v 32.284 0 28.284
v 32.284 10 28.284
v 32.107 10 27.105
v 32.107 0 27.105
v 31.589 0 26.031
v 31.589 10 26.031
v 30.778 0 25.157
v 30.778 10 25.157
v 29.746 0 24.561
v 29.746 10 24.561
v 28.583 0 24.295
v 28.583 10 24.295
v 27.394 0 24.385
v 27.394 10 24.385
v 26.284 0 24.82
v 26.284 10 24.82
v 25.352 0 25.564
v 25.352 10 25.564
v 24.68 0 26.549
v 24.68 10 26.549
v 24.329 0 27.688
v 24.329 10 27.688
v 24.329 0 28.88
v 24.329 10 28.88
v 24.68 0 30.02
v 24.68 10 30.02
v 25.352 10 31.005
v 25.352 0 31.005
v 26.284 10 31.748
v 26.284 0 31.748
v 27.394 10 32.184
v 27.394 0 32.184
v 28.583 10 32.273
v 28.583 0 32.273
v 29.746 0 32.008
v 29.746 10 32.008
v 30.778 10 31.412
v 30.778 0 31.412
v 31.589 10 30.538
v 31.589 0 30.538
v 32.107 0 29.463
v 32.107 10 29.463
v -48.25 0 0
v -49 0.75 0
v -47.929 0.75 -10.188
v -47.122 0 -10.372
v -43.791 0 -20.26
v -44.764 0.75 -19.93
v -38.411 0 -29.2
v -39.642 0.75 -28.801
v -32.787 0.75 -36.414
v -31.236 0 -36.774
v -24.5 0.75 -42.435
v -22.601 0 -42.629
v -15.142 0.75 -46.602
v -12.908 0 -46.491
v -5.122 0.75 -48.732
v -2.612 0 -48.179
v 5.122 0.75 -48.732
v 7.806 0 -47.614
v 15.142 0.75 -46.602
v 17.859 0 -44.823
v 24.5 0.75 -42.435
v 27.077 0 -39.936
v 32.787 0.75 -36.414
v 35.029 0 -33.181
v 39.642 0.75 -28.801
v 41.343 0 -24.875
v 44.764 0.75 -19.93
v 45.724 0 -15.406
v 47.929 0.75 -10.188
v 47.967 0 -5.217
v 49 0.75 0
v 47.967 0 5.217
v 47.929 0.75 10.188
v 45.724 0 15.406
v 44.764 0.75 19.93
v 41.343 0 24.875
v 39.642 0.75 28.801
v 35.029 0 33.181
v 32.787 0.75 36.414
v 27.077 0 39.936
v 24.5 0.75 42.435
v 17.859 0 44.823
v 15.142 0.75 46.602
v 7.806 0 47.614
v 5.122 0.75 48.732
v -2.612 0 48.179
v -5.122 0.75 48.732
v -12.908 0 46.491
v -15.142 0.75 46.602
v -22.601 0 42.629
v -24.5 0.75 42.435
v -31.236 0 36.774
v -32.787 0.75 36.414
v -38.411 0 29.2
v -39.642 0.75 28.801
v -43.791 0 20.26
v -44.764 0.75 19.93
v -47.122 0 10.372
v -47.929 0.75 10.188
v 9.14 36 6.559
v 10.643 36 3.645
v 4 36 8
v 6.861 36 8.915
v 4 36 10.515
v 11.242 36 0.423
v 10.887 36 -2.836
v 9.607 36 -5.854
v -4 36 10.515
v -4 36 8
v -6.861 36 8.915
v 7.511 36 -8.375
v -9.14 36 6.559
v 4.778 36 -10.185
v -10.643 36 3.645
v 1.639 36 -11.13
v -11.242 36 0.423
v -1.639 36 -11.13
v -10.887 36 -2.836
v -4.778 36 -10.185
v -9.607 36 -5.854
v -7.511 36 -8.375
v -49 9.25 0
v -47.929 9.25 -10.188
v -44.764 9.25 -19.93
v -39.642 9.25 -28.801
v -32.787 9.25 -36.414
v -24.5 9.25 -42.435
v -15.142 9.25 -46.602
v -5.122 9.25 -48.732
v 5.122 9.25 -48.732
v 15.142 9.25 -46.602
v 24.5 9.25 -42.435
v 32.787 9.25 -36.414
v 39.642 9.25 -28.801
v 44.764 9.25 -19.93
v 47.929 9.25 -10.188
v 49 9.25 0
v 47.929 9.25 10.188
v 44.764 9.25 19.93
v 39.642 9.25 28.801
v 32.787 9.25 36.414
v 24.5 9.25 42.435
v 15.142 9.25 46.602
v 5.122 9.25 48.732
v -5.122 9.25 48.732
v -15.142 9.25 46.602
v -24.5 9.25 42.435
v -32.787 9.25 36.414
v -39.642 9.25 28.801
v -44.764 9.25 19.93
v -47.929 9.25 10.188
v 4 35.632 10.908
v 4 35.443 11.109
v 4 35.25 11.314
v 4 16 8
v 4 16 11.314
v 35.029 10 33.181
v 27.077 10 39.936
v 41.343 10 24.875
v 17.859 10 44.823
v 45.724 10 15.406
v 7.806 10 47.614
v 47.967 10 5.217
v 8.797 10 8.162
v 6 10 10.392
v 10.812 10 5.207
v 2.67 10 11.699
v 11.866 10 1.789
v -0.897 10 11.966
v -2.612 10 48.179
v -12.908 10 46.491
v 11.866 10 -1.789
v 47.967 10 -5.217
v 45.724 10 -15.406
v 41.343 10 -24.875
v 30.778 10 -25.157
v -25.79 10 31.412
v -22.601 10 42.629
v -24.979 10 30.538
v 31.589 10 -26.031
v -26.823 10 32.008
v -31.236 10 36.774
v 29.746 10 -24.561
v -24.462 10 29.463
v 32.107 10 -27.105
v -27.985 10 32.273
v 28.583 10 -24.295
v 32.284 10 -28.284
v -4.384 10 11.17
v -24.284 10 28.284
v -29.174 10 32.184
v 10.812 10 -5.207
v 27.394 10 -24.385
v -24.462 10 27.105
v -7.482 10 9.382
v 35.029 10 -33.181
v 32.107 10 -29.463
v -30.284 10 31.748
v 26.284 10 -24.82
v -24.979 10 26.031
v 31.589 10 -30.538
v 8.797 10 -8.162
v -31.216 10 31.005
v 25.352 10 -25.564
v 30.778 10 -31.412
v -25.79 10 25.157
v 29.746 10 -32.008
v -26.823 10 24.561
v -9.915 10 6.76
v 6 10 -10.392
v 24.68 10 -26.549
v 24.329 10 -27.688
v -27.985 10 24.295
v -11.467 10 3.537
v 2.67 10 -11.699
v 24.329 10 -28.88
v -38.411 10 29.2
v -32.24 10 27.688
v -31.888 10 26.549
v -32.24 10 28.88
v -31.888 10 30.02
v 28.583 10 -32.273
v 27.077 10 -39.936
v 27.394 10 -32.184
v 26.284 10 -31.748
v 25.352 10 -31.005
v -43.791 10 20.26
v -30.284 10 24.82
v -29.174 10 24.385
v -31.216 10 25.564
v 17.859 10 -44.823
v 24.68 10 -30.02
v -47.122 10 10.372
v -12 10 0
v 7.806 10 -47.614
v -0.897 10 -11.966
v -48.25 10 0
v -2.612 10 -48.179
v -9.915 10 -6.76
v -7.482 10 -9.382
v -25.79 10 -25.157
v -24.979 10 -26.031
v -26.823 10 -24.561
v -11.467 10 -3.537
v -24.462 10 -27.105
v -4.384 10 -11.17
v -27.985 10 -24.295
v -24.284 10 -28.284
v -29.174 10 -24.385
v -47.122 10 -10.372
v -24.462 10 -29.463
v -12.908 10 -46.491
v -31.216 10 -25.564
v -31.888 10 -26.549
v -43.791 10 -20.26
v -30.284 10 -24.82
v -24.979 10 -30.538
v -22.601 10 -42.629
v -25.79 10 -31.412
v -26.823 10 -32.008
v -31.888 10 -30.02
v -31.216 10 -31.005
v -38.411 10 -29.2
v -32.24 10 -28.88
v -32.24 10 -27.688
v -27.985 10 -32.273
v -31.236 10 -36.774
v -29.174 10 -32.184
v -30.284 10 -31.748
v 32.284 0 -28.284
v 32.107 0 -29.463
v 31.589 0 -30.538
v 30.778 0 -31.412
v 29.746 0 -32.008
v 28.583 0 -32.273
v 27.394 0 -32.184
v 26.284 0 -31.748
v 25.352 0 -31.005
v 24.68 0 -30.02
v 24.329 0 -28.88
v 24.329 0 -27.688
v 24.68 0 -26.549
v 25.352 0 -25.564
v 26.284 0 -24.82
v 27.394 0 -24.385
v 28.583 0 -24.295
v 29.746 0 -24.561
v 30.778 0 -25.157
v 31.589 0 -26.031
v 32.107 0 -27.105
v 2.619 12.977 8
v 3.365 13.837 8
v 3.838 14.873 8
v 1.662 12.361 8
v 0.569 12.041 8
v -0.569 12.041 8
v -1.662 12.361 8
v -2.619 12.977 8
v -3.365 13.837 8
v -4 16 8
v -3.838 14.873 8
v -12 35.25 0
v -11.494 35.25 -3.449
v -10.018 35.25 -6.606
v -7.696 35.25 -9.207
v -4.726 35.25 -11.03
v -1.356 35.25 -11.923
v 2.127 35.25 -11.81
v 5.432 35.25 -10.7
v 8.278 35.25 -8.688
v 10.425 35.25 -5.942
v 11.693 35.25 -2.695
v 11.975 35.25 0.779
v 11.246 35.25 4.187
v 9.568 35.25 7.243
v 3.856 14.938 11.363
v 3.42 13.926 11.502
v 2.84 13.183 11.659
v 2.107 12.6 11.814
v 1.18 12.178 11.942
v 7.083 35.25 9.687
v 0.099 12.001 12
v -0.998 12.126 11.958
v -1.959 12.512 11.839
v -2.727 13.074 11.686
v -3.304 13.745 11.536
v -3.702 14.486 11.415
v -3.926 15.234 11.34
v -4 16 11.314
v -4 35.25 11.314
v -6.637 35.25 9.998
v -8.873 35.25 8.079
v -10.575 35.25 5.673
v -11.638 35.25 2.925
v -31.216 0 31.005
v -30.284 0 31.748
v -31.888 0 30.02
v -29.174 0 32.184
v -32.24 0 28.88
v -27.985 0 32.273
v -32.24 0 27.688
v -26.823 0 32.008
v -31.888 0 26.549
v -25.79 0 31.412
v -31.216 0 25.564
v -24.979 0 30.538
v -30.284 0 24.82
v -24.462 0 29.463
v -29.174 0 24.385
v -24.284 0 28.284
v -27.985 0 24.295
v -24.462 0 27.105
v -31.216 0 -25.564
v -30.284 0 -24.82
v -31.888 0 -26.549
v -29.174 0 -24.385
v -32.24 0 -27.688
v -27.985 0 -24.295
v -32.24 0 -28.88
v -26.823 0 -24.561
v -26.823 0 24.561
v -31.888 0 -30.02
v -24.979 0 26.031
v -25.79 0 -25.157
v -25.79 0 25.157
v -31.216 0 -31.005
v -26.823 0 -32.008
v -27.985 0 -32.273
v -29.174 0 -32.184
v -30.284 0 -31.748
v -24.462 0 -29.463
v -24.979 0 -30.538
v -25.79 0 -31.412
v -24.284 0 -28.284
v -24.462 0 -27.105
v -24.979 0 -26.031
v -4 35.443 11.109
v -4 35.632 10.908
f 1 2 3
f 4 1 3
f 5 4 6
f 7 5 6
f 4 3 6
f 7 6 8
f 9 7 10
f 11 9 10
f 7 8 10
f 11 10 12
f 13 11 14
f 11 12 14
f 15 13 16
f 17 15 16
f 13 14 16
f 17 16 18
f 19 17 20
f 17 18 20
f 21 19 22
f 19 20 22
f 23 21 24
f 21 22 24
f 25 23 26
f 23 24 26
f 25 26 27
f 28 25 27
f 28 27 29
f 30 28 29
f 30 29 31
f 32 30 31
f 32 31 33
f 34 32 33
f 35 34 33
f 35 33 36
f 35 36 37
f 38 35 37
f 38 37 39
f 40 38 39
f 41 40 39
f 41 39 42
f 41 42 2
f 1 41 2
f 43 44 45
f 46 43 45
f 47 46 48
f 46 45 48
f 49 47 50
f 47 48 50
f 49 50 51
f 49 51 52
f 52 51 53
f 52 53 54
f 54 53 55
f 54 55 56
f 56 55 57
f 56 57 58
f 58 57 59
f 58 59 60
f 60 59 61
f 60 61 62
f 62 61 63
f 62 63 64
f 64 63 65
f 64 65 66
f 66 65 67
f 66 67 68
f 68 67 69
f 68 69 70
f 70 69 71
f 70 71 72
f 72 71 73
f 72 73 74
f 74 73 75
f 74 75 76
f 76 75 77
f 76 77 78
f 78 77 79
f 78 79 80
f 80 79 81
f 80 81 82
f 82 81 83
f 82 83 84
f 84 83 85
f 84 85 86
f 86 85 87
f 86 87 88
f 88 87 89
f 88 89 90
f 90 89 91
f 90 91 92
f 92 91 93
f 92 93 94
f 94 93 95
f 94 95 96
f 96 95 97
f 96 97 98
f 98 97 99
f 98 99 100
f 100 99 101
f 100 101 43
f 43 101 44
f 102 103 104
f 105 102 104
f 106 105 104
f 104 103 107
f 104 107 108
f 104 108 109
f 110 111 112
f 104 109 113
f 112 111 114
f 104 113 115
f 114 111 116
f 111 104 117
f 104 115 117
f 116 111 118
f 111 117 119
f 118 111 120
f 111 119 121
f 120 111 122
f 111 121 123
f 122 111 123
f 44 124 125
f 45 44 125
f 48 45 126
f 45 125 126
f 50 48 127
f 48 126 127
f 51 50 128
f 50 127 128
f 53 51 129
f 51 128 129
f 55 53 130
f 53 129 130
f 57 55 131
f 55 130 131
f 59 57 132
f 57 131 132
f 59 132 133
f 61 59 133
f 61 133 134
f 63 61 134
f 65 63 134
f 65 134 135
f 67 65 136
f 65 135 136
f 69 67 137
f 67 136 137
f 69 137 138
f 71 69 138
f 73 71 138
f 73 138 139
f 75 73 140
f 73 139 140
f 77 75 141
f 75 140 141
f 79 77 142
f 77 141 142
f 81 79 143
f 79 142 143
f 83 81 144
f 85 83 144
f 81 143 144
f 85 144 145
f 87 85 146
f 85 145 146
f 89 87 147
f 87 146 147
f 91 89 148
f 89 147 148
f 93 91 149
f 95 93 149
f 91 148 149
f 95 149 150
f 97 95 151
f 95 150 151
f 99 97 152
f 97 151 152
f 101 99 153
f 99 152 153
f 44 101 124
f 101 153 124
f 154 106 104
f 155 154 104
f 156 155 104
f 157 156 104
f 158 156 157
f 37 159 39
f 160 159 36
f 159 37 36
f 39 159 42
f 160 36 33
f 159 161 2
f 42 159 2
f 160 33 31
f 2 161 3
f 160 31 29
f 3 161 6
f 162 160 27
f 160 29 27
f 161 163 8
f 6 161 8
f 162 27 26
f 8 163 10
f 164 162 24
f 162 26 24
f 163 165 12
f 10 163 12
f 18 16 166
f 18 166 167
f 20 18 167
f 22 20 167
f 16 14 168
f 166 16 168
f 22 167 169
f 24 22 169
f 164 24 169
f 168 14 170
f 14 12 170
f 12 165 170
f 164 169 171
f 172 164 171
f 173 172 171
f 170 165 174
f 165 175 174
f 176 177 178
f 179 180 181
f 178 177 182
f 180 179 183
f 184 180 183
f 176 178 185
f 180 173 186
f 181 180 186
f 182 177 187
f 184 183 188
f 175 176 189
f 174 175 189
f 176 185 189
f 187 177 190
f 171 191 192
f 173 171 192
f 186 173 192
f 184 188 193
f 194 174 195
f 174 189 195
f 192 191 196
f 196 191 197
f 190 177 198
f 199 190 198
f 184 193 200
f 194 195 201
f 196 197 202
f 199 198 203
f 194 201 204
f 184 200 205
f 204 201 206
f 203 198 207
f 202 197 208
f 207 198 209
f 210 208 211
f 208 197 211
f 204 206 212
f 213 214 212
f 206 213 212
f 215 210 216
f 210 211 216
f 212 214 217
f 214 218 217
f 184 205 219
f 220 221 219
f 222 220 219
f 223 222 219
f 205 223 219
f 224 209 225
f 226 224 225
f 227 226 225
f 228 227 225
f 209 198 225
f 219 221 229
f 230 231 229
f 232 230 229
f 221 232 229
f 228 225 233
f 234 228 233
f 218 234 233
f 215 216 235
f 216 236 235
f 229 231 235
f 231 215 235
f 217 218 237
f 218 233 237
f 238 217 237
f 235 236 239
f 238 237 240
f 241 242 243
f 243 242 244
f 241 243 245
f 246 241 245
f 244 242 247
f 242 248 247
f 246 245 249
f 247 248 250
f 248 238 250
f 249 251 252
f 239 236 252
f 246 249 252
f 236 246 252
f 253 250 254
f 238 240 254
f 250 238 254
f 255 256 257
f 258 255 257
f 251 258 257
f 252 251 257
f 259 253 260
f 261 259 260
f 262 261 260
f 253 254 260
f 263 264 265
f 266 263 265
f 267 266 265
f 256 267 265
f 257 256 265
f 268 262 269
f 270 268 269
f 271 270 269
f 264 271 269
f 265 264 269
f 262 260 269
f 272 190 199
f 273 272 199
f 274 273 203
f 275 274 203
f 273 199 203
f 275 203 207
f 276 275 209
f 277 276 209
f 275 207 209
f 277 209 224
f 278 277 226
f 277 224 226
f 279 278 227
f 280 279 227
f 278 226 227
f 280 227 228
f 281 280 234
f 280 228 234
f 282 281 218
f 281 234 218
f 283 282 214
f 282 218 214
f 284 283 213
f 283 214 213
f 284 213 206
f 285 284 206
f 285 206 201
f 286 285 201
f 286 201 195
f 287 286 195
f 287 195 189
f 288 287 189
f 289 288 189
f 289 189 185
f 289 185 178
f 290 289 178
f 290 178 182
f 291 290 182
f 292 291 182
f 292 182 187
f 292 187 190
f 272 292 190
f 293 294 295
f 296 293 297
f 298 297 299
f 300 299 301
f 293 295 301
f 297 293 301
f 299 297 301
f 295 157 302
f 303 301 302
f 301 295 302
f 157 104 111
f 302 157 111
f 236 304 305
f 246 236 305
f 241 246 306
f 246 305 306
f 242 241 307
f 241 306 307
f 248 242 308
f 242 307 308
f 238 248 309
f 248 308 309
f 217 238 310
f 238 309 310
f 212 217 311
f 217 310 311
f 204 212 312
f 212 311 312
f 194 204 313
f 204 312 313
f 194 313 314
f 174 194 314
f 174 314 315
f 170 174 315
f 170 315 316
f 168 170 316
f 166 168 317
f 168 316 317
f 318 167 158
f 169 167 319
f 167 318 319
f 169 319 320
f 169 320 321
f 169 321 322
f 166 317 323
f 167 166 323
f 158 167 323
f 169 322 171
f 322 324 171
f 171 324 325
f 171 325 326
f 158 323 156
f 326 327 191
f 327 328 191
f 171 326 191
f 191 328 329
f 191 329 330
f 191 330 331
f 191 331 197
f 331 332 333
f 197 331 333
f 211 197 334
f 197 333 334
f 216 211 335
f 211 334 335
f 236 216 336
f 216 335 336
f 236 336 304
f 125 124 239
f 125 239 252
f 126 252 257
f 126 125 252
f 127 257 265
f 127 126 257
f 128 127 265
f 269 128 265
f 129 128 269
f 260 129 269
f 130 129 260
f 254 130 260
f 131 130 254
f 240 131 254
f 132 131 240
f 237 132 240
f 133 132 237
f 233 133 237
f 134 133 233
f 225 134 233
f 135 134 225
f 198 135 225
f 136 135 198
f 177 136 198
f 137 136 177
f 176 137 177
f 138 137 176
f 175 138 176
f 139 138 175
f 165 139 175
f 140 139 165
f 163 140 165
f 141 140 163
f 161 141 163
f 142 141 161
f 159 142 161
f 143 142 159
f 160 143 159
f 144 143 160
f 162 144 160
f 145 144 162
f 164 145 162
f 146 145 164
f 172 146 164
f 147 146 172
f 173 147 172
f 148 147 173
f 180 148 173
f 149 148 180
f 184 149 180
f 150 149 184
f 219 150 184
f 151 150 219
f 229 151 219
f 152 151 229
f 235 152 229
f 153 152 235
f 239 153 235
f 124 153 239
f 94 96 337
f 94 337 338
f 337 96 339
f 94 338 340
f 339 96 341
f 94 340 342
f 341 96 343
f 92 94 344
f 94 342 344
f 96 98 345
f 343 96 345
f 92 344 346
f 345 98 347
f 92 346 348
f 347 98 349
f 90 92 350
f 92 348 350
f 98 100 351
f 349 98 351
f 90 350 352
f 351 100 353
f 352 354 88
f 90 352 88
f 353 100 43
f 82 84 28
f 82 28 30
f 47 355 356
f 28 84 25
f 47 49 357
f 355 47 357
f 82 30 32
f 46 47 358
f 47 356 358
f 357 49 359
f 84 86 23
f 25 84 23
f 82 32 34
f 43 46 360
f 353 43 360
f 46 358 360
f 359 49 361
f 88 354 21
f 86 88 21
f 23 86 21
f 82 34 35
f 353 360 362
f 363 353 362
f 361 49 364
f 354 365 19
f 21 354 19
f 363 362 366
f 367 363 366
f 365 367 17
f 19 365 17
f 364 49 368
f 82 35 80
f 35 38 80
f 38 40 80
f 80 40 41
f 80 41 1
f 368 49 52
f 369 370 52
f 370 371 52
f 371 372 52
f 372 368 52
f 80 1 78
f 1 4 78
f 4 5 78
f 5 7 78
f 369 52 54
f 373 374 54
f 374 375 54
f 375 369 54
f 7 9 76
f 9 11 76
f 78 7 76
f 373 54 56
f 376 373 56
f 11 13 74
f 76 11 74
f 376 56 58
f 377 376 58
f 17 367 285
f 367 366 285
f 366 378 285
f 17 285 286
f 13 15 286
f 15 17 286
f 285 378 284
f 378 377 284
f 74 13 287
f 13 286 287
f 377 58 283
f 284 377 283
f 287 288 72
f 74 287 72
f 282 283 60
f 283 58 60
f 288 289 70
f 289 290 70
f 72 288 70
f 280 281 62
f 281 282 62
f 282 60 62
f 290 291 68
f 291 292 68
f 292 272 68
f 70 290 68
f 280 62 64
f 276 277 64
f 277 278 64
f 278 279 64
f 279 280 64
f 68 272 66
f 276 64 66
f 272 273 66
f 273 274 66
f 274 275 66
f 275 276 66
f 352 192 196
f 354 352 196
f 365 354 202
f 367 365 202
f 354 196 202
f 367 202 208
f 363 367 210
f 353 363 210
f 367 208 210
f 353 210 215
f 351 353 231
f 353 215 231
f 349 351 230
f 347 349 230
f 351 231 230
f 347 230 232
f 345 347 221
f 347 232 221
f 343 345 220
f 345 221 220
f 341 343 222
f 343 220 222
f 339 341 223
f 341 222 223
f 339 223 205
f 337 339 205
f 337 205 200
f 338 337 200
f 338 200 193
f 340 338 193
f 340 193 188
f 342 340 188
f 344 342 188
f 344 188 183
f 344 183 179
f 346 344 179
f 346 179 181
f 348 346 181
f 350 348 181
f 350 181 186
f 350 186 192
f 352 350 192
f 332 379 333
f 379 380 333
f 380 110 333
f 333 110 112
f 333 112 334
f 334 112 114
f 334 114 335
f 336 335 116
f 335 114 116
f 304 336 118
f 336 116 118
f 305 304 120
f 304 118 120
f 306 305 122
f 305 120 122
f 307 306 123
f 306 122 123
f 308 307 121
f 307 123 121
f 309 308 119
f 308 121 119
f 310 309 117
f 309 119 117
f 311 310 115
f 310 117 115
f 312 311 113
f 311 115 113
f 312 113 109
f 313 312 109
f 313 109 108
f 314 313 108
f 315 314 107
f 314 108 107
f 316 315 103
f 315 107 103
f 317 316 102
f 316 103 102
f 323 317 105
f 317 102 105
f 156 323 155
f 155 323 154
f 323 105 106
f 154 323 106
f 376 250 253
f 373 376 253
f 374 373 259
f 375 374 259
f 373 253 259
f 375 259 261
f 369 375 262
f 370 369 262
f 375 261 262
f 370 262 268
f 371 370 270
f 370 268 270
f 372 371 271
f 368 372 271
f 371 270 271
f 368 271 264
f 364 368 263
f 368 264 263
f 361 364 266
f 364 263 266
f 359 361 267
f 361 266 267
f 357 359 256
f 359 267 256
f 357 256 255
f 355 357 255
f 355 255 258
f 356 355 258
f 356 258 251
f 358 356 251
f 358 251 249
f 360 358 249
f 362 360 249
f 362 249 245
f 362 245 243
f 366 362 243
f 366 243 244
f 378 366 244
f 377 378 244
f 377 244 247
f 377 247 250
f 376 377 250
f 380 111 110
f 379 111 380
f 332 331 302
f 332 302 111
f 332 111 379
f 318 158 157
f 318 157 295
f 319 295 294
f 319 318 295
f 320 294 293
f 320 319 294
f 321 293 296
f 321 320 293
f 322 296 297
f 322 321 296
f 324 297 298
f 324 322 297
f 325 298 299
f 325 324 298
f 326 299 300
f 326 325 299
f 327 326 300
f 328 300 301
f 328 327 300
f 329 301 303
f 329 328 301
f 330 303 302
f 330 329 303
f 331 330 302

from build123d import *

# Parameters (mm, degrees)
CUT_EXTRUDE1_REACH = 76.014
SKETCH2_R          = 4
CUT_EXTRUDE2_DEPTH = 4
CHAMFER1_SIZE      = 0.75


with BuildPart() as part:
    # Sketch1 → Revolve1 (revolve)
    with BuildSketch(Plane.XY):
        Polygon((0, 0), (-49, 0), (-49, 10), (-12, 10), (-12, 36), (0, 36), align=None)
    revolve(axis=Axis((0, 36, 0), (0, -1, 0)))

    # Sketch2 → Cut-Extrude1 (cut, up to next)
    with BuildSketch(Plane(origin=(0, 10, 0), x_dir=(1, 0, 0), z_dir=(0, 1, 0)), mode=Mode.PRIVATE) as cut_extrude1_sk1:
        with Locations((-28.284271247, 28.284271247)):
            Circle(SKETCH2_R)
    cut_extrude1_tool1 = extrude(cut_extrude1_sk1.sketch, amount=-CUT_EXTRUDE1_REACH, mode=Mode.PRIVATE) & part.part
    # Sketch2 → Cut-Extrude1 (cut, up to next)
    with BuildSketch(Plane(origin=(0, 10, 0), x_dir=(1, 0, 0), z_dir=(0, 1, 0)), mode=Mode.PRIVATE) as cut_extrude1_sk2:
        with Locations((28.284271247, 28.284271247)):
            Circle(SKETCH2_R)
    cut_extrude1_tool2 = extrude(cut_extrude1_sk2.sketch, amount=-CUT_EXTRUDE1_REACH, mode=Mode.PRIVATE) & part.part
    # Sketch2 → Cut-Extrude1 (cut, up to next)
    with BuildSketch(Plane(origin=(0, 10, 0), x_dir=(1, 0, 0), z_dir=(0, 1, 0)), mode=Mode.PRIVATE) as cut_extrude1_sk3:
        with Locations((28.284271247, -28.284271247)):
            Circle(SKETCH2_R)
    cut_extrude1_tool3 = extrude(cut_extrude1_sk3.sketch, amount=-CUT_EXTRUDE1_REACH, mode=Mode.PRIVATE) & part.part
    # Sketch2 → Cut-Extrude1 (cut, up to next)
    with BuildSketch(Plane(origin=(0, 10, 0), x_dir=(1, 0, 0), z_dir=(0, 1, 0)), mode=Mode.PRIVATE) as cut_extrude1_sk4:
        with Locations((-28.284271247, -28.284271247)):
            Circle(SKETCH2_R)
    cut_extrude1_tool4 = extrude(cut_extrude1_sk4.sketch, amount=-CUT_EXTRUDE1_REACH, mode=Mode.PRIVATE) & part.part
    add(cut_extrude1_tool1.solids().sort_by_distance((-28.284271, 10, -28.284271))[0], mode=Mode.SUBTRACT)
    add(cut_extrude1_tool2.solids().sort_by_distance((28.284271, 10, -28.284271))[0], mode=Mode.SUBTRACT)
    add(cut_extrude1_tool3.solids().sort_by_distance((28.284271, 10, 28.284271))[0], mode=Mode.SUBTRACT)
    add(cut_extrude1_tool4.solids().sort_by_distance((-28.284271, 10, 28.284271))[0], mode=Mode.SUBTRACT)

    # Sketch3 → Cut-Extrude2 (cut)
    with BuildSketch(Plane.XY.offset(12)):
        with BuildLine():
            Line((-4, 36), (4, 36))
            Line((4, 36), (4, 16))
            ThreePointArc((4, 16), (0, 12), (-4, 16))
            Line((-4, 16), (-4, 36))
        make_face()
    extrude(amount=-CUT_EXTRUDE2_DEPTH, mode=Mode.SUBTRACT)

    # Chamfer1
    chamfer1_edges = [part.edges().sort_by_distance(p)[0] for p in [
        (49, 0, 0),
        (49, 10, 0),
        (6.92820323, 36, -9.797958971),
    ]]
    chamfer(chamfer1_edges, length=CHAMFER1_SIZE)


solid = part.part
